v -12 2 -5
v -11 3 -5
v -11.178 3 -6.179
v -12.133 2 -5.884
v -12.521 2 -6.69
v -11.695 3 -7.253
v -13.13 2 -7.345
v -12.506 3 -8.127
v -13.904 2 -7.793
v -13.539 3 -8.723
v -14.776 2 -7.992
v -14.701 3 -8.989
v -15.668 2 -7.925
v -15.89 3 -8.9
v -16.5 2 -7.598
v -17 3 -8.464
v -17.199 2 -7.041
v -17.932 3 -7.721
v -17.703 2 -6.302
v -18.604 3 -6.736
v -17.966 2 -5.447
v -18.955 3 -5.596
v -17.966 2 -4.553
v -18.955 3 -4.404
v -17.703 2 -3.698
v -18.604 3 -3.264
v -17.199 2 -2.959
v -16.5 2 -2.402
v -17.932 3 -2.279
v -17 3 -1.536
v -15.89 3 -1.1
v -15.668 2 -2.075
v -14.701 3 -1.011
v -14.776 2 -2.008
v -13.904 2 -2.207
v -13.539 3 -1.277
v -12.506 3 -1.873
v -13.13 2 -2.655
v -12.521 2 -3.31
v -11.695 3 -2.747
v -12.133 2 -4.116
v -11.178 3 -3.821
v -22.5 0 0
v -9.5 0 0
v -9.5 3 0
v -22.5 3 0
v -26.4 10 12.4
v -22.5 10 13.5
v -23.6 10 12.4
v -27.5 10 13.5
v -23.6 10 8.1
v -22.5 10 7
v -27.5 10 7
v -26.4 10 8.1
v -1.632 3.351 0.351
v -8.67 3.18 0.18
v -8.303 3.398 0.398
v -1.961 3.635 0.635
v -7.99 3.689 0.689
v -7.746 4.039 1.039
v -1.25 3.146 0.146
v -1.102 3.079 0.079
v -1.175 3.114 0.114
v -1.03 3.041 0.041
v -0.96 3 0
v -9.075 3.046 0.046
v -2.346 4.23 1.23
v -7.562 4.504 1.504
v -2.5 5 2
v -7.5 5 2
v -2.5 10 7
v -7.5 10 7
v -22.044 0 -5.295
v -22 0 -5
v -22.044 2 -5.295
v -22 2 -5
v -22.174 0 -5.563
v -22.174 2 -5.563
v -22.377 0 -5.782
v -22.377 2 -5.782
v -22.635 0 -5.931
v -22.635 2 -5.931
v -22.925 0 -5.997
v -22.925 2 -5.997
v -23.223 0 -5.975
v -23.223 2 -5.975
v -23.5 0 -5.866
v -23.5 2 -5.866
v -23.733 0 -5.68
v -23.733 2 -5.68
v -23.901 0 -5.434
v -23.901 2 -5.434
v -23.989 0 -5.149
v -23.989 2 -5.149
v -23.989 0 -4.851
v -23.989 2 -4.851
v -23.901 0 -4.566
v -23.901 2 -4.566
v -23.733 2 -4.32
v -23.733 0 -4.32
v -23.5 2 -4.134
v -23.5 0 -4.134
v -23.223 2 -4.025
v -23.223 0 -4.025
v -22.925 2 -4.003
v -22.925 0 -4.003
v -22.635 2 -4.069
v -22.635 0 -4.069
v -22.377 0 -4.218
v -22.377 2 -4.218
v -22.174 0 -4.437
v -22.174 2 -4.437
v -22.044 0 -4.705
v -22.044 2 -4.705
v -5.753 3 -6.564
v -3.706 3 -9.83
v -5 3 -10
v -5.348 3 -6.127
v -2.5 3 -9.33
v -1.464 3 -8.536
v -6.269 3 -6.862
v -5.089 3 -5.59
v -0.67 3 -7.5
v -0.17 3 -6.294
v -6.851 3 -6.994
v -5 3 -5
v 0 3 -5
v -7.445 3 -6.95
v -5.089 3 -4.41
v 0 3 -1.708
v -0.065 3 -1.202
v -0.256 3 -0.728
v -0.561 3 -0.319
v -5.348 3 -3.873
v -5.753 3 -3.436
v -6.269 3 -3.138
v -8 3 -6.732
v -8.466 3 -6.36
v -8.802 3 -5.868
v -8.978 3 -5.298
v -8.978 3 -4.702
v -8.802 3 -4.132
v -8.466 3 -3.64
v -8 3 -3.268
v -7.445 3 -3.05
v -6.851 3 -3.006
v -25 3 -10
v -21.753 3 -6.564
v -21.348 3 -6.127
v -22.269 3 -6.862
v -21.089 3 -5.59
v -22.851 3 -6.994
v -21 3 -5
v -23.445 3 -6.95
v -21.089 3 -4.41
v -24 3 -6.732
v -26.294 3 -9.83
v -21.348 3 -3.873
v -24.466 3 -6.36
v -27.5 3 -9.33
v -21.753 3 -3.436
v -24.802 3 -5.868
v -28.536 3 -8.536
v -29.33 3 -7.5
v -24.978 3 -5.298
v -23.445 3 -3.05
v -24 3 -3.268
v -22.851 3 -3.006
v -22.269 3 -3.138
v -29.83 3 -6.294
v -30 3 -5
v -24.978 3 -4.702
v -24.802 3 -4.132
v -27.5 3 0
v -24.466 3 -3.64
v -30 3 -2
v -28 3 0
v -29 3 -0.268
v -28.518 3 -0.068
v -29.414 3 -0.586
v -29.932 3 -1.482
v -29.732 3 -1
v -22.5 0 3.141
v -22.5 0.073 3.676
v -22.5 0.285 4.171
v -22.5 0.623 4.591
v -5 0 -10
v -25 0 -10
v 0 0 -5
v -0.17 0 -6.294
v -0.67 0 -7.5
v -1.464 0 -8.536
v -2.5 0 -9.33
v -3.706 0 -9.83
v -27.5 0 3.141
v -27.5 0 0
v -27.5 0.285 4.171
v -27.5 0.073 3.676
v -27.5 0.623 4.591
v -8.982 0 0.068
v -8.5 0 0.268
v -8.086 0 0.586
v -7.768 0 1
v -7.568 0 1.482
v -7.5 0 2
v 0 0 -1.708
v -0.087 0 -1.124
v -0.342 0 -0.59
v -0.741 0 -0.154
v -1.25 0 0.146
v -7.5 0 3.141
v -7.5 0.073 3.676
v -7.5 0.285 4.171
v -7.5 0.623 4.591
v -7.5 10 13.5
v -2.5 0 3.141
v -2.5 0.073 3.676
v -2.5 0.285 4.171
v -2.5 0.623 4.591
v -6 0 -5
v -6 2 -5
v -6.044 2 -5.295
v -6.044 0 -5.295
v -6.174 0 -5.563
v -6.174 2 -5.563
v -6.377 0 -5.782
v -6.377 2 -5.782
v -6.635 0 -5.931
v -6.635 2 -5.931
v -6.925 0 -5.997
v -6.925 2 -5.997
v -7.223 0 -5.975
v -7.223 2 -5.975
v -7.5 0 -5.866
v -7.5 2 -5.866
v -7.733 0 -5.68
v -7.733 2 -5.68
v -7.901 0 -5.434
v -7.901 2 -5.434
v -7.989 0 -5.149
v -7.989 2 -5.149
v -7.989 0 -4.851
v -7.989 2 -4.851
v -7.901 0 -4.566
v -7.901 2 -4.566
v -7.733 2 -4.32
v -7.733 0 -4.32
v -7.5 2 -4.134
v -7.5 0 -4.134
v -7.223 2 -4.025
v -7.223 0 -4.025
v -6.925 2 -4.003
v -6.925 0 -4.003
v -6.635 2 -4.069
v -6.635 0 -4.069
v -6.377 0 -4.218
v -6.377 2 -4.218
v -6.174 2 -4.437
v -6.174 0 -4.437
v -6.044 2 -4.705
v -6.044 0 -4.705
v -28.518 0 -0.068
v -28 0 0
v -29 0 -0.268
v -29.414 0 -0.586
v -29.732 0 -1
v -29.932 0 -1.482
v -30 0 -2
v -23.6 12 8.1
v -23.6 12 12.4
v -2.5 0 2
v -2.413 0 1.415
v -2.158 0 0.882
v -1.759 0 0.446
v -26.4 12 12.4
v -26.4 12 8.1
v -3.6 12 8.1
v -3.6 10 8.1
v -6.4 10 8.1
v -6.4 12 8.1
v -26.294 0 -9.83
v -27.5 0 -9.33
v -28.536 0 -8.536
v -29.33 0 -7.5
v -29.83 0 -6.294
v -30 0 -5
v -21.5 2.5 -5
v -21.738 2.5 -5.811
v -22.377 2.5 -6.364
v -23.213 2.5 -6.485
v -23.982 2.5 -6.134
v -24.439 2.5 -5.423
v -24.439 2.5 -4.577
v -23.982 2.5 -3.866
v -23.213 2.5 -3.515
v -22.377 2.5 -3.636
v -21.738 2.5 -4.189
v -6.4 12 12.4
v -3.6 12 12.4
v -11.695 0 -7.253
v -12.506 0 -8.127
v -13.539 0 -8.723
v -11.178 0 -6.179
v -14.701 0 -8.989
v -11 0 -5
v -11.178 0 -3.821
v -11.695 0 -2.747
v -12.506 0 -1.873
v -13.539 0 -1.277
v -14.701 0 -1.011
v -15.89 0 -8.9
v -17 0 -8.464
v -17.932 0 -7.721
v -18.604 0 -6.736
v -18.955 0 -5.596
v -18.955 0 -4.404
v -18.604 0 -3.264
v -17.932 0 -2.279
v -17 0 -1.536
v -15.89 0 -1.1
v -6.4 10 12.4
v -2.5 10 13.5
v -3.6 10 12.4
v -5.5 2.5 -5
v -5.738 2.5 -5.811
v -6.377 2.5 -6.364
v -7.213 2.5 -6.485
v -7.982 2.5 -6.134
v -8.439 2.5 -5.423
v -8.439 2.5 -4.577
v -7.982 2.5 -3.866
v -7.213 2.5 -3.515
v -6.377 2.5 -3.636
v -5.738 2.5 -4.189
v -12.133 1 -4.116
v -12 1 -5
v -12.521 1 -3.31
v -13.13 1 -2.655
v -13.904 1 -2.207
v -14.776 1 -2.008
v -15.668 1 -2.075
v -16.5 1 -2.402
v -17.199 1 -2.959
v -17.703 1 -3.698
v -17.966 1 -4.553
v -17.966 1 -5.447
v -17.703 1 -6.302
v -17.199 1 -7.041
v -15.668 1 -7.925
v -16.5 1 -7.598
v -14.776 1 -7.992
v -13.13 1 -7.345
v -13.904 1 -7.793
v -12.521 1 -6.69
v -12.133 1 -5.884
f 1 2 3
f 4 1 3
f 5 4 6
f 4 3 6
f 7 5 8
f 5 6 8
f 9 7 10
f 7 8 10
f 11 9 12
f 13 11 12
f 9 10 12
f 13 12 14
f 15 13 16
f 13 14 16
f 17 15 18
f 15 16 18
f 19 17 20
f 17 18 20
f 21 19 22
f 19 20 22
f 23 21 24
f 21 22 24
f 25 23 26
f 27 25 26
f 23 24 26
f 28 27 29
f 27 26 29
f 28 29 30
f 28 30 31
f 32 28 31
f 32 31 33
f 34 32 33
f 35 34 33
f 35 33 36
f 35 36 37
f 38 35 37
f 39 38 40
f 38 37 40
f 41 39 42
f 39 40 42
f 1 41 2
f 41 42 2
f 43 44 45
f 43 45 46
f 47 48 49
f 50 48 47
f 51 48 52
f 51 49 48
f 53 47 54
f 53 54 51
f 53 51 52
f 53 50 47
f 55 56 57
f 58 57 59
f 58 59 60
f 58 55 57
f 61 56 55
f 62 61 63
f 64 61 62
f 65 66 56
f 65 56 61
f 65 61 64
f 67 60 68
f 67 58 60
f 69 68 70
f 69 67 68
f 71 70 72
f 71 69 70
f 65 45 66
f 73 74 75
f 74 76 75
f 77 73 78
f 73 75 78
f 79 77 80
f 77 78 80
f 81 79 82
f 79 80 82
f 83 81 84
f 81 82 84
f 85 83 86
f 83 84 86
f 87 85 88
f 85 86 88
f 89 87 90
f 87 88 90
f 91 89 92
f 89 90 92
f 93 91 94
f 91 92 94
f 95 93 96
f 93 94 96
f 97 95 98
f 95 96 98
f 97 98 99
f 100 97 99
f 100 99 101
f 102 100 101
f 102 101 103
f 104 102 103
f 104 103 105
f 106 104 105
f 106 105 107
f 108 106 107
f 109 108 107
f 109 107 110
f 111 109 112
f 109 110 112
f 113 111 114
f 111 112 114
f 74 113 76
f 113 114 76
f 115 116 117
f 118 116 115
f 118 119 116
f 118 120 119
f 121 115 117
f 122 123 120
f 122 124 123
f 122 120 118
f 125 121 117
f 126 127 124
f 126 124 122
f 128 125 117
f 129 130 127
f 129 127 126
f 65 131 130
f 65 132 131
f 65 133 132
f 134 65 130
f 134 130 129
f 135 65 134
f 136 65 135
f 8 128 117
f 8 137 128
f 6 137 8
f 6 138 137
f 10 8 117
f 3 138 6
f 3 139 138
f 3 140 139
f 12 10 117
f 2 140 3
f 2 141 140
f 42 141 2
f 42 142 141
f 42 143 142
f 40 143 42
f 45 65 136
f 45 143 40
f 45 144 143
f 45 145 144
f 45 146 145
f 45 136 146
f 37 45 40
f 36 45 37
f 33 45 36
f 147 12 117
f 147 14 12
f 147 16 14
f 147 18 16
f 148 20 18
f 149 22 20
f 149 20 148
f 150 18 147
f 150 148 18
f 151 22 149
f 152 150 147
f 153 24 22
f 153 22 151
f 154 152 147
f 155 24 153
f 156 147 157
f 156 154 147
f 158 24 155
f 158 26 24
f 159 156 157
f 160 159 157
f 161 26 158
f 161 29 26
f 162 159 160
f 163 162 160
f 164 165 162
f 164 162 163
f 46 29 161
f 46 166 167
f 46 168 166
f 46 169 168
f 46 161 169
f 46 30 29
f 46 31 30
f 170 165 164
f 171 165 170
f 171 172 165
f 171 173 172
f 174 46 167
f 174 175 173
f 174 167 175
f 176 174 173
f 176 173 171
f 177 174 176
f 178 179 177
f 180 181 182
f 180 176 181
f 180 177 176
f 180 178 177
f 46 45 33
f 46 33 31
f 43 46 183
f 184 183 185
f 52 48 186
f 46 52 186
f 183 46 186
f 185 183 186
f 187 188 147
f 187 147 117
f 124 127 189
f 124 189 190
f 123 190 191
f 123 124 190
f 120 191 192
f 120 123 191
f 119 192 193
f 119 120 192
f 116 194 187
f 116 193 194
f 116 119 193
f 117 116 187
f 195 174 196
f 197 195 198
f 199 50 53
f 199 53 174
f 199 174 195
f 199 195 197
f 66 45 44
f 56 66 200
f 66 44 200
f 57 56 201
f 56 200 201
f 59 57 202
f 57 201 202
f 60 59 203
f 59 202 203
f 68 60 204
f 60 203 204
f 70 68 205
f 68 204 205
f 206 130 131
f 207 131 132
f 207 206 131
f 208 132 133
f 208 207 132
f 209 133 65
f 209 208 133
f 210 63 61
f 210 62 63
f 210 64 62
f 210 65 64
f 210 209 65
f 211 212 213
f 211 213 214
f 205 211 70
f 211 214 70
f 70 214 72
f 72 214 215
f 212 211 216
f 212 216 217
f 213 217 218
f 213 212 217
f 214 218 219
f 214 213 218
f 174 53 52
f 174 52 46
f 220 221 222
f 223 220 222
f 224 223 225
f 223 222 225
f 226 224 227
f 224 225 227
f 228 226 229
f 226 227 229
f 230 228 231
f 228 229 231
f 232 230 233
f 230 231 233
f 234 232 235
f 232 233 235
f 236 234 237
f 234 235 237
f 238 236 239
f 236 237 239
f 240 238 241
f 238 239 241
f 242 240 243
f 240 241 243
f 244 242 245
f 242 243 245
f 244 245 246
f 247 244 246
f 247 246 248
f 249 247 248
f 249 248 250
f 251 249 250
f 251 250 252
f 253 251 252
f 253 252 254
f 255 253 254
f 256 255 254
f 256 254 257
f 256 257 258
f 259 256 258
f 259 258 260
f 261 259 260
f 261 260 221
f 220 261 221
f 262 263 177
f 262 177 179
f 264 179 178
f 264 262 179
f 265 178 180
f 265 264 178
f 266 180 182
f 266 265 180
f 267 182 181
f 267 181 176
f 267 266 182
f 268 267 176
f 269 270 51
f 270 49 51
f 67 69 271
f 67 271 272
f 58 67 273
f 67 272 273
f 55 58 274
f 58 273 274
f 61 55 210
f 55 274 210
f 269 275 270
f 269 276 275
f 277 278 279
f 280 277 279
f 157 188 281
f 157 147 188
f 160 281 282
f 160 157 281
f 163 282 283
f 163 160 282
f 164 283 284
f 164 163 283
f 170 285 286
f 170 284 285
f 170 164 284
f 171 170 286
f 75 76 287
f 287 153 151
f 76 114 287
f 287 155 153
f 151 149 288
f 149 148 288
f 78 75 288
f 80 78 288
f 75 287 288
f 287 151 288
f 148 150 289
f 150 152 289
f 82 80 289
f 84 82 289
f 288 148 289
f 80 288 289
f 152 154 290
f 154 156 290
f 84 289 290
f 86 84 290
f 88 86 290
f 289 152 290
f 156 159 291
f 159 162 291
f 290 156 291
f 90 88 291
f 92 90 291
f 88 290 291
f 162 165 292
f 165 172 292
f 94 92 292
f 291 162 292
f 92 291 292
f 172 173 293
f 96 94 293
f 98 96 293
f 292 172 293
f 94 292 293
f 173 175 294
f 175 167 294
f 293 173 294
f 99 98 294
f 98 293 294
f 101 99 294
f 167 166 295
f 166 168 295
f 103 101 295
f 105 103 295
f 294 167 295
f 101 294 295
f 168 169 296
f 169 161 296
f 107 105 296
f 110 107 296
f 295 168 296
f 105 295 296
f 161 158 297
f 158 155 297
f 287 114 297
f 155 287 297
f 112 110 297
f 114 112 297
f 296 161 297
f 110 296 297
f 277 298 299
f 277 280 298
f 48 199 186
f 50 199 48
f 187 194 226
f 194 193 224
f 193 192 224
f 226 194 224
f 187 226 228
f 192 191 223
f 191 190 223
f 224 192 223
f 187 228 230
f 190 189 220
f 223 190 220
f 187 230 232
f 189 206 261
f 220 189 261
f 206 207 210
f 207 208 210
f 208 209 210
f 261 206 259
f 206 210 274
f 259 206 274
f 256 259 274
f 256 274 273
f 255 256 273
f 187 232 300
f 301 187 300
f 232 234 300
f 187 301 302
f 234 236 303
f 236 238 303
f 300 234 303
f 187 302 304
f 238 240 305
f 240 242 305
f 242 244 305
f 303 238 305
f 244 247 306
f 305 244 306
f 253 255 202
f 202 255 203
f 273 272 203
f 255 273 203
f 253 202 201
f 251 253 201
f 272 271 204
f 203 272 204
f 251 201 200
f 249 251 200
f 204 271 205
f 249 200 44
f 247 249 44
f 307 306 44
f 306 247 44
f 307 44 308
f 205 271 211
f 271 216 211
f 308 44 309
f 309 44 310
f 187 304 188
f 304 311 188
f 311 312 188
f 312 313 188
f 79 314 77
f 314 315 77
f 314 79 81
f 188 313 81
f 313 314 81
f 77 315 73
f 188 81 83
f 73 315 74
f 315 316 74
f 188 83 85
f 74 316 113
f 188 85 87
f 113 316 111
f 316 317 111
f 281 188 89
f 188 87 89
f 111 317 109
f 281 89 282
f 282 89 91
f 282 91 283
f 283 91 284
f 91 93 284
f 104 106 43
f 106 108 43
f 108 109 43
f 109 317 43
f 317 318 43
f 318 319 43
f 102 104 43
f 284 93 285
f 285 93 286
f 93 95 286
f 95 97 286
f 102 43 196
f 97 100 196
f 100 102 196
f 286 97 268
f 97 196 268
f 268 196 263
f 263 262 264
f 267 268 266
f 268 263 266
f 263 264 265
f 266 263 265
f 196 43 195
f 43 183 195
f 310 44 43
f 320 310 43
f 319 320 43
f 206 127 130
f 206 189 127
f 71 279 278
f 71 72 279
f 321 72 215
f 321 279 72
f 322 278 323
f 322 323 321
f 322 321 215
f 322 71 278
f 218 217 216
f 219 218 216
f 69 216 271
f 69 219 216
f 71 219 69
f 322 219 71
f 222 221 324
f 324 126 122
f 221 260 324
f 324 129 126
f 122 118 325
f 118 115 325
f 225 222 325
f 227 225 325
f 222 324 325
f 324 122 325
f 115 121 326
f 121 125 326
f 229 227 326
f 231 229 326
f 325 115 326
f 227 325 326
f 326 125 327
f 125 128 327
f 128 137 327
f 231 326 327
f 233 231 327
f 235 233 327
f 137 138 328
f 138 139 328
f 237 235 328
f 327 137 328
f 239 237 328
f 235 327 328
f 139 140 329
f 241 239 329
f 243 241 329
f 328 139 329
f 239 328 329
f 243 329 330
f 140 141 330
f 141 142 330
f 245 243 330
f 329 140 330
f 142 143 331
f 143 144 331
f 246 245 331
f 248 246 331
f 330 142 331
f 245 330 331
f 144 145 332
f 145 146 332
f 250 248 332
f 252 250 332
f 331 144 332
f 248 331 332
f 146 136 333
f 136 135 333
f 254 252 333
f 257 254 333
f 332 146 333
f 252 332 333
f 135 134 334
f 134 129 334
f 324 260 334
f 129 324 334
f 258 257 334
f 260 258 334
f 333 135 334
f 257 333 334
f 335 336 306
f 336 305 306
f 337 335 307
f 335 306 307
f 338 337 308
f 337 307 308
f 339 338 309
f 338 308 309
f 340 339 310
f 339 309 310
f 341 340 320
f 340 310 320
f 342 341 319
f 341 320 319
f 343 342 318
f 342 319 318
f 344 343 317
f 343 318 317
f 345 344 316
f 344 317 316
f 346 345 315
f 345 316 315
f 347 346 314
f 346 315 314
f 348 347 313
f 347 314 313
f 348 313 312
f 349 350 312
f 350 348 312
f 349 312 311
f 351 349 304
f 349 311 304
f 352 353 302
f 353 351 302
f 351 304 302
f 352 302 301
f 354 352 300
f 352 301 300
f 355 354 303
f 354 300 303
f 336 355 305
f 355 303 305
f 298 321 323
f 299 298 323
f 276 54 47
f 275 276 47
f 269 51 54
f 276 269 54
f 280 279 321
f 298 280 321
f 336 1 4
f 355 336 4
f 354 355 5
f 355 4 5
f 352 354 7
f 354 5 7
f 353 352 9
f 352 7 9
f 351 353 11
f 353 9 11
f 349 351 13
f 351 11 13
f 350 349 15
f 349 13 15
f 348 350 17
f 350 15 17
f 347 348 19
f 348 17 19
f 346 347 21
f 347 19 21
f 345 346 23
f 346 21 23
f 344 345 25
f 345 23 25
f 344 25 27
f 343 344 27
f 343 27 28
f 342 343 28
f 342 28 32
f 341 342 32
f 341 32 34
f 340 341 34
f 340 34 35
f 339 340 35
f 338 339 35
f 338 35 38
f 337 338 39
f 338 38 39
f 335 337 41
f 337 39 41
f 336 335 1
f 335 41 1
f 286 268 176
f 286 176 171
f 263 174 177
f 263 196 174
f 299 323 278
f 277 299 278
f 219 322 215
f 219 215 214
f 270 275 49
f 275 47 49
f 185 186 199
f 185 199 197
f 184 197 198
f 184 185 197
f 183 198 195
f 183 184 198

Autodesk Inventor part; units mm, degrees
ref_plane "XZ Plane" through (0, 0, 0) normal (0, 1, 0) x (-1, 0, 0)
sketch "Sketch1" plane through (0, 0, 0) normal (0, 1, 0) x (-1, 0, 0)
  line L0 (0, 0) -> (30, 0)
  line L1 (30, 0) -> (30, -10)
  line L2 (30, -10) -> (0, -10)
  line L3 (0, -10) -> (0, 0)
  dimension "d0" = 30
  dimension "d1" = 10
extrude "Extrusion1" add sketch "Sketch1" along normal blind 3
ref_plane "Work Plane2" through (-2.5, 0, 0) normal (1, 0, 0) x (0, 1, 0)
sketch "Sketch3" plane through (-2.5, 0, 0) normal (1, 0, 0) x (0, 1, 0)
  line L0 (3, -10) -> (3, 0) projected
  line L1 (3, 0) -> (10, 7)
  line L2 (10, 7) -> (10, 13.5)
  line L3 (10, 13.5) -> (0, 4)
  line L4 (0, 4) -> (0, 0)
  line L5 (0, 0) -> (3, 0) projected
  line L6 (3, 0) -> (0, 0)
  dimension "d13" = 4
  dimension "d14" = 6.5
  dimension "d15" = 45
  dimension "d16" = 10
extrude "Extrusion3" add sketch "Sketch3" against normal blind 5
ref_plane "Work Plane3" through (-15, 0, 0) normal (1, 0, 0) x (0, 1, 0)
fillet "Fillet2" radius 2 1 edges at (-5, 0, 4)
fillet "Fillet3" radius 2 4 edges at (-30, 1.5, 0) (-7.5, 1.5, 0) (-2.5, 1.5, 0) (0, 1.5, 0)
fillet "Fillet4" radius 5 2 edges at (-30, 1.5, -10) (0, 1.5, -10)
sketch "Sketch5" plane through (-2.5, 10, 13.5) normal (0, 1, 0) x (1, 0, 0)
  line L0 (-1.1, 5.4) -> (-3.9, 5.4)
  line L1 (-3.9, 5.4) -> (-3.9, 1.1)
  line L2 (-3.9, 1.1) -> (-1.1, 1.1)
  line L3 (-1.1, 1.1) -> (-1.1, 5.4)
  line L4 (-5, 0) -> (-5, 6.5) projected
  line L5 (0, 6.5) -> (-5, 6.5) projected
  point P0 (2.5, 13.5)
  dimension "d26" = 2.8
  dimension "d27" = 4.3
  dimension "d28" = 1.1
  dimension "d29" = 1.1
extrude "Extrusion4" add sketch "Sketch5" along normal blind 2
mirror "Mirror2" about plane through (-15, 0, 0) normal (1, 0, 0) of "Extrusion3", "Extrusion4"
sketch "Sketch6" plane through (0, 3, 0) normal (0, 1, 0) x (1, 0, 0)
  circle A0 centre (-15, 5) radius 3
  line L0 (-5, 10) -> (-25, 10) projected
  line L1 (0, 1.7081) -> (0, 5) projected
  point P0 (0, 0)
  dimension "d32" = 6
  dimension "d33" = 5
  dimension "d34" = 15
extrude "Extrusion5" cut sketch "Sketch6" against normal through all
chamfer "Chamfer1" distance 1 angle 45 1 edges at (-18, 3, -5)
sketch "Sketch7" plane through (0, 3, 0) normal (0, 1, 0) x (1, 0, 0)
  circle A0 centre (-23, 5) radius 1
  circle A1 centre (-7, 5) radius 1
  line L0 (-5, 10) -> (-25, 10) projected
  circle A2 centre (-15, 5) radius 3 projected
  point P0 (0, 0)
  dimension "d40" = 2
  dimension "d41" = 2
  dimension "d42" = 5
  dimension "d43" = 5
  dimension "d44" = 8
  dimension "d45" = 8
extrude "Extrusion6" cut sketch "Sketch7" against normal through all contours A0 | A1
chamfer "Chamfer2" distance 1 angle 45 2 edges at (-8, 3, -5) (-24, 3, -5)
fillet "Fillet5" radius 2 1 edges at (-25, 0, 4)
chamfer "Chamfer3" distance 1 angle 45 1 edges at (-18, 0, -5)
properties part number "ServoUltrasonicMount"
